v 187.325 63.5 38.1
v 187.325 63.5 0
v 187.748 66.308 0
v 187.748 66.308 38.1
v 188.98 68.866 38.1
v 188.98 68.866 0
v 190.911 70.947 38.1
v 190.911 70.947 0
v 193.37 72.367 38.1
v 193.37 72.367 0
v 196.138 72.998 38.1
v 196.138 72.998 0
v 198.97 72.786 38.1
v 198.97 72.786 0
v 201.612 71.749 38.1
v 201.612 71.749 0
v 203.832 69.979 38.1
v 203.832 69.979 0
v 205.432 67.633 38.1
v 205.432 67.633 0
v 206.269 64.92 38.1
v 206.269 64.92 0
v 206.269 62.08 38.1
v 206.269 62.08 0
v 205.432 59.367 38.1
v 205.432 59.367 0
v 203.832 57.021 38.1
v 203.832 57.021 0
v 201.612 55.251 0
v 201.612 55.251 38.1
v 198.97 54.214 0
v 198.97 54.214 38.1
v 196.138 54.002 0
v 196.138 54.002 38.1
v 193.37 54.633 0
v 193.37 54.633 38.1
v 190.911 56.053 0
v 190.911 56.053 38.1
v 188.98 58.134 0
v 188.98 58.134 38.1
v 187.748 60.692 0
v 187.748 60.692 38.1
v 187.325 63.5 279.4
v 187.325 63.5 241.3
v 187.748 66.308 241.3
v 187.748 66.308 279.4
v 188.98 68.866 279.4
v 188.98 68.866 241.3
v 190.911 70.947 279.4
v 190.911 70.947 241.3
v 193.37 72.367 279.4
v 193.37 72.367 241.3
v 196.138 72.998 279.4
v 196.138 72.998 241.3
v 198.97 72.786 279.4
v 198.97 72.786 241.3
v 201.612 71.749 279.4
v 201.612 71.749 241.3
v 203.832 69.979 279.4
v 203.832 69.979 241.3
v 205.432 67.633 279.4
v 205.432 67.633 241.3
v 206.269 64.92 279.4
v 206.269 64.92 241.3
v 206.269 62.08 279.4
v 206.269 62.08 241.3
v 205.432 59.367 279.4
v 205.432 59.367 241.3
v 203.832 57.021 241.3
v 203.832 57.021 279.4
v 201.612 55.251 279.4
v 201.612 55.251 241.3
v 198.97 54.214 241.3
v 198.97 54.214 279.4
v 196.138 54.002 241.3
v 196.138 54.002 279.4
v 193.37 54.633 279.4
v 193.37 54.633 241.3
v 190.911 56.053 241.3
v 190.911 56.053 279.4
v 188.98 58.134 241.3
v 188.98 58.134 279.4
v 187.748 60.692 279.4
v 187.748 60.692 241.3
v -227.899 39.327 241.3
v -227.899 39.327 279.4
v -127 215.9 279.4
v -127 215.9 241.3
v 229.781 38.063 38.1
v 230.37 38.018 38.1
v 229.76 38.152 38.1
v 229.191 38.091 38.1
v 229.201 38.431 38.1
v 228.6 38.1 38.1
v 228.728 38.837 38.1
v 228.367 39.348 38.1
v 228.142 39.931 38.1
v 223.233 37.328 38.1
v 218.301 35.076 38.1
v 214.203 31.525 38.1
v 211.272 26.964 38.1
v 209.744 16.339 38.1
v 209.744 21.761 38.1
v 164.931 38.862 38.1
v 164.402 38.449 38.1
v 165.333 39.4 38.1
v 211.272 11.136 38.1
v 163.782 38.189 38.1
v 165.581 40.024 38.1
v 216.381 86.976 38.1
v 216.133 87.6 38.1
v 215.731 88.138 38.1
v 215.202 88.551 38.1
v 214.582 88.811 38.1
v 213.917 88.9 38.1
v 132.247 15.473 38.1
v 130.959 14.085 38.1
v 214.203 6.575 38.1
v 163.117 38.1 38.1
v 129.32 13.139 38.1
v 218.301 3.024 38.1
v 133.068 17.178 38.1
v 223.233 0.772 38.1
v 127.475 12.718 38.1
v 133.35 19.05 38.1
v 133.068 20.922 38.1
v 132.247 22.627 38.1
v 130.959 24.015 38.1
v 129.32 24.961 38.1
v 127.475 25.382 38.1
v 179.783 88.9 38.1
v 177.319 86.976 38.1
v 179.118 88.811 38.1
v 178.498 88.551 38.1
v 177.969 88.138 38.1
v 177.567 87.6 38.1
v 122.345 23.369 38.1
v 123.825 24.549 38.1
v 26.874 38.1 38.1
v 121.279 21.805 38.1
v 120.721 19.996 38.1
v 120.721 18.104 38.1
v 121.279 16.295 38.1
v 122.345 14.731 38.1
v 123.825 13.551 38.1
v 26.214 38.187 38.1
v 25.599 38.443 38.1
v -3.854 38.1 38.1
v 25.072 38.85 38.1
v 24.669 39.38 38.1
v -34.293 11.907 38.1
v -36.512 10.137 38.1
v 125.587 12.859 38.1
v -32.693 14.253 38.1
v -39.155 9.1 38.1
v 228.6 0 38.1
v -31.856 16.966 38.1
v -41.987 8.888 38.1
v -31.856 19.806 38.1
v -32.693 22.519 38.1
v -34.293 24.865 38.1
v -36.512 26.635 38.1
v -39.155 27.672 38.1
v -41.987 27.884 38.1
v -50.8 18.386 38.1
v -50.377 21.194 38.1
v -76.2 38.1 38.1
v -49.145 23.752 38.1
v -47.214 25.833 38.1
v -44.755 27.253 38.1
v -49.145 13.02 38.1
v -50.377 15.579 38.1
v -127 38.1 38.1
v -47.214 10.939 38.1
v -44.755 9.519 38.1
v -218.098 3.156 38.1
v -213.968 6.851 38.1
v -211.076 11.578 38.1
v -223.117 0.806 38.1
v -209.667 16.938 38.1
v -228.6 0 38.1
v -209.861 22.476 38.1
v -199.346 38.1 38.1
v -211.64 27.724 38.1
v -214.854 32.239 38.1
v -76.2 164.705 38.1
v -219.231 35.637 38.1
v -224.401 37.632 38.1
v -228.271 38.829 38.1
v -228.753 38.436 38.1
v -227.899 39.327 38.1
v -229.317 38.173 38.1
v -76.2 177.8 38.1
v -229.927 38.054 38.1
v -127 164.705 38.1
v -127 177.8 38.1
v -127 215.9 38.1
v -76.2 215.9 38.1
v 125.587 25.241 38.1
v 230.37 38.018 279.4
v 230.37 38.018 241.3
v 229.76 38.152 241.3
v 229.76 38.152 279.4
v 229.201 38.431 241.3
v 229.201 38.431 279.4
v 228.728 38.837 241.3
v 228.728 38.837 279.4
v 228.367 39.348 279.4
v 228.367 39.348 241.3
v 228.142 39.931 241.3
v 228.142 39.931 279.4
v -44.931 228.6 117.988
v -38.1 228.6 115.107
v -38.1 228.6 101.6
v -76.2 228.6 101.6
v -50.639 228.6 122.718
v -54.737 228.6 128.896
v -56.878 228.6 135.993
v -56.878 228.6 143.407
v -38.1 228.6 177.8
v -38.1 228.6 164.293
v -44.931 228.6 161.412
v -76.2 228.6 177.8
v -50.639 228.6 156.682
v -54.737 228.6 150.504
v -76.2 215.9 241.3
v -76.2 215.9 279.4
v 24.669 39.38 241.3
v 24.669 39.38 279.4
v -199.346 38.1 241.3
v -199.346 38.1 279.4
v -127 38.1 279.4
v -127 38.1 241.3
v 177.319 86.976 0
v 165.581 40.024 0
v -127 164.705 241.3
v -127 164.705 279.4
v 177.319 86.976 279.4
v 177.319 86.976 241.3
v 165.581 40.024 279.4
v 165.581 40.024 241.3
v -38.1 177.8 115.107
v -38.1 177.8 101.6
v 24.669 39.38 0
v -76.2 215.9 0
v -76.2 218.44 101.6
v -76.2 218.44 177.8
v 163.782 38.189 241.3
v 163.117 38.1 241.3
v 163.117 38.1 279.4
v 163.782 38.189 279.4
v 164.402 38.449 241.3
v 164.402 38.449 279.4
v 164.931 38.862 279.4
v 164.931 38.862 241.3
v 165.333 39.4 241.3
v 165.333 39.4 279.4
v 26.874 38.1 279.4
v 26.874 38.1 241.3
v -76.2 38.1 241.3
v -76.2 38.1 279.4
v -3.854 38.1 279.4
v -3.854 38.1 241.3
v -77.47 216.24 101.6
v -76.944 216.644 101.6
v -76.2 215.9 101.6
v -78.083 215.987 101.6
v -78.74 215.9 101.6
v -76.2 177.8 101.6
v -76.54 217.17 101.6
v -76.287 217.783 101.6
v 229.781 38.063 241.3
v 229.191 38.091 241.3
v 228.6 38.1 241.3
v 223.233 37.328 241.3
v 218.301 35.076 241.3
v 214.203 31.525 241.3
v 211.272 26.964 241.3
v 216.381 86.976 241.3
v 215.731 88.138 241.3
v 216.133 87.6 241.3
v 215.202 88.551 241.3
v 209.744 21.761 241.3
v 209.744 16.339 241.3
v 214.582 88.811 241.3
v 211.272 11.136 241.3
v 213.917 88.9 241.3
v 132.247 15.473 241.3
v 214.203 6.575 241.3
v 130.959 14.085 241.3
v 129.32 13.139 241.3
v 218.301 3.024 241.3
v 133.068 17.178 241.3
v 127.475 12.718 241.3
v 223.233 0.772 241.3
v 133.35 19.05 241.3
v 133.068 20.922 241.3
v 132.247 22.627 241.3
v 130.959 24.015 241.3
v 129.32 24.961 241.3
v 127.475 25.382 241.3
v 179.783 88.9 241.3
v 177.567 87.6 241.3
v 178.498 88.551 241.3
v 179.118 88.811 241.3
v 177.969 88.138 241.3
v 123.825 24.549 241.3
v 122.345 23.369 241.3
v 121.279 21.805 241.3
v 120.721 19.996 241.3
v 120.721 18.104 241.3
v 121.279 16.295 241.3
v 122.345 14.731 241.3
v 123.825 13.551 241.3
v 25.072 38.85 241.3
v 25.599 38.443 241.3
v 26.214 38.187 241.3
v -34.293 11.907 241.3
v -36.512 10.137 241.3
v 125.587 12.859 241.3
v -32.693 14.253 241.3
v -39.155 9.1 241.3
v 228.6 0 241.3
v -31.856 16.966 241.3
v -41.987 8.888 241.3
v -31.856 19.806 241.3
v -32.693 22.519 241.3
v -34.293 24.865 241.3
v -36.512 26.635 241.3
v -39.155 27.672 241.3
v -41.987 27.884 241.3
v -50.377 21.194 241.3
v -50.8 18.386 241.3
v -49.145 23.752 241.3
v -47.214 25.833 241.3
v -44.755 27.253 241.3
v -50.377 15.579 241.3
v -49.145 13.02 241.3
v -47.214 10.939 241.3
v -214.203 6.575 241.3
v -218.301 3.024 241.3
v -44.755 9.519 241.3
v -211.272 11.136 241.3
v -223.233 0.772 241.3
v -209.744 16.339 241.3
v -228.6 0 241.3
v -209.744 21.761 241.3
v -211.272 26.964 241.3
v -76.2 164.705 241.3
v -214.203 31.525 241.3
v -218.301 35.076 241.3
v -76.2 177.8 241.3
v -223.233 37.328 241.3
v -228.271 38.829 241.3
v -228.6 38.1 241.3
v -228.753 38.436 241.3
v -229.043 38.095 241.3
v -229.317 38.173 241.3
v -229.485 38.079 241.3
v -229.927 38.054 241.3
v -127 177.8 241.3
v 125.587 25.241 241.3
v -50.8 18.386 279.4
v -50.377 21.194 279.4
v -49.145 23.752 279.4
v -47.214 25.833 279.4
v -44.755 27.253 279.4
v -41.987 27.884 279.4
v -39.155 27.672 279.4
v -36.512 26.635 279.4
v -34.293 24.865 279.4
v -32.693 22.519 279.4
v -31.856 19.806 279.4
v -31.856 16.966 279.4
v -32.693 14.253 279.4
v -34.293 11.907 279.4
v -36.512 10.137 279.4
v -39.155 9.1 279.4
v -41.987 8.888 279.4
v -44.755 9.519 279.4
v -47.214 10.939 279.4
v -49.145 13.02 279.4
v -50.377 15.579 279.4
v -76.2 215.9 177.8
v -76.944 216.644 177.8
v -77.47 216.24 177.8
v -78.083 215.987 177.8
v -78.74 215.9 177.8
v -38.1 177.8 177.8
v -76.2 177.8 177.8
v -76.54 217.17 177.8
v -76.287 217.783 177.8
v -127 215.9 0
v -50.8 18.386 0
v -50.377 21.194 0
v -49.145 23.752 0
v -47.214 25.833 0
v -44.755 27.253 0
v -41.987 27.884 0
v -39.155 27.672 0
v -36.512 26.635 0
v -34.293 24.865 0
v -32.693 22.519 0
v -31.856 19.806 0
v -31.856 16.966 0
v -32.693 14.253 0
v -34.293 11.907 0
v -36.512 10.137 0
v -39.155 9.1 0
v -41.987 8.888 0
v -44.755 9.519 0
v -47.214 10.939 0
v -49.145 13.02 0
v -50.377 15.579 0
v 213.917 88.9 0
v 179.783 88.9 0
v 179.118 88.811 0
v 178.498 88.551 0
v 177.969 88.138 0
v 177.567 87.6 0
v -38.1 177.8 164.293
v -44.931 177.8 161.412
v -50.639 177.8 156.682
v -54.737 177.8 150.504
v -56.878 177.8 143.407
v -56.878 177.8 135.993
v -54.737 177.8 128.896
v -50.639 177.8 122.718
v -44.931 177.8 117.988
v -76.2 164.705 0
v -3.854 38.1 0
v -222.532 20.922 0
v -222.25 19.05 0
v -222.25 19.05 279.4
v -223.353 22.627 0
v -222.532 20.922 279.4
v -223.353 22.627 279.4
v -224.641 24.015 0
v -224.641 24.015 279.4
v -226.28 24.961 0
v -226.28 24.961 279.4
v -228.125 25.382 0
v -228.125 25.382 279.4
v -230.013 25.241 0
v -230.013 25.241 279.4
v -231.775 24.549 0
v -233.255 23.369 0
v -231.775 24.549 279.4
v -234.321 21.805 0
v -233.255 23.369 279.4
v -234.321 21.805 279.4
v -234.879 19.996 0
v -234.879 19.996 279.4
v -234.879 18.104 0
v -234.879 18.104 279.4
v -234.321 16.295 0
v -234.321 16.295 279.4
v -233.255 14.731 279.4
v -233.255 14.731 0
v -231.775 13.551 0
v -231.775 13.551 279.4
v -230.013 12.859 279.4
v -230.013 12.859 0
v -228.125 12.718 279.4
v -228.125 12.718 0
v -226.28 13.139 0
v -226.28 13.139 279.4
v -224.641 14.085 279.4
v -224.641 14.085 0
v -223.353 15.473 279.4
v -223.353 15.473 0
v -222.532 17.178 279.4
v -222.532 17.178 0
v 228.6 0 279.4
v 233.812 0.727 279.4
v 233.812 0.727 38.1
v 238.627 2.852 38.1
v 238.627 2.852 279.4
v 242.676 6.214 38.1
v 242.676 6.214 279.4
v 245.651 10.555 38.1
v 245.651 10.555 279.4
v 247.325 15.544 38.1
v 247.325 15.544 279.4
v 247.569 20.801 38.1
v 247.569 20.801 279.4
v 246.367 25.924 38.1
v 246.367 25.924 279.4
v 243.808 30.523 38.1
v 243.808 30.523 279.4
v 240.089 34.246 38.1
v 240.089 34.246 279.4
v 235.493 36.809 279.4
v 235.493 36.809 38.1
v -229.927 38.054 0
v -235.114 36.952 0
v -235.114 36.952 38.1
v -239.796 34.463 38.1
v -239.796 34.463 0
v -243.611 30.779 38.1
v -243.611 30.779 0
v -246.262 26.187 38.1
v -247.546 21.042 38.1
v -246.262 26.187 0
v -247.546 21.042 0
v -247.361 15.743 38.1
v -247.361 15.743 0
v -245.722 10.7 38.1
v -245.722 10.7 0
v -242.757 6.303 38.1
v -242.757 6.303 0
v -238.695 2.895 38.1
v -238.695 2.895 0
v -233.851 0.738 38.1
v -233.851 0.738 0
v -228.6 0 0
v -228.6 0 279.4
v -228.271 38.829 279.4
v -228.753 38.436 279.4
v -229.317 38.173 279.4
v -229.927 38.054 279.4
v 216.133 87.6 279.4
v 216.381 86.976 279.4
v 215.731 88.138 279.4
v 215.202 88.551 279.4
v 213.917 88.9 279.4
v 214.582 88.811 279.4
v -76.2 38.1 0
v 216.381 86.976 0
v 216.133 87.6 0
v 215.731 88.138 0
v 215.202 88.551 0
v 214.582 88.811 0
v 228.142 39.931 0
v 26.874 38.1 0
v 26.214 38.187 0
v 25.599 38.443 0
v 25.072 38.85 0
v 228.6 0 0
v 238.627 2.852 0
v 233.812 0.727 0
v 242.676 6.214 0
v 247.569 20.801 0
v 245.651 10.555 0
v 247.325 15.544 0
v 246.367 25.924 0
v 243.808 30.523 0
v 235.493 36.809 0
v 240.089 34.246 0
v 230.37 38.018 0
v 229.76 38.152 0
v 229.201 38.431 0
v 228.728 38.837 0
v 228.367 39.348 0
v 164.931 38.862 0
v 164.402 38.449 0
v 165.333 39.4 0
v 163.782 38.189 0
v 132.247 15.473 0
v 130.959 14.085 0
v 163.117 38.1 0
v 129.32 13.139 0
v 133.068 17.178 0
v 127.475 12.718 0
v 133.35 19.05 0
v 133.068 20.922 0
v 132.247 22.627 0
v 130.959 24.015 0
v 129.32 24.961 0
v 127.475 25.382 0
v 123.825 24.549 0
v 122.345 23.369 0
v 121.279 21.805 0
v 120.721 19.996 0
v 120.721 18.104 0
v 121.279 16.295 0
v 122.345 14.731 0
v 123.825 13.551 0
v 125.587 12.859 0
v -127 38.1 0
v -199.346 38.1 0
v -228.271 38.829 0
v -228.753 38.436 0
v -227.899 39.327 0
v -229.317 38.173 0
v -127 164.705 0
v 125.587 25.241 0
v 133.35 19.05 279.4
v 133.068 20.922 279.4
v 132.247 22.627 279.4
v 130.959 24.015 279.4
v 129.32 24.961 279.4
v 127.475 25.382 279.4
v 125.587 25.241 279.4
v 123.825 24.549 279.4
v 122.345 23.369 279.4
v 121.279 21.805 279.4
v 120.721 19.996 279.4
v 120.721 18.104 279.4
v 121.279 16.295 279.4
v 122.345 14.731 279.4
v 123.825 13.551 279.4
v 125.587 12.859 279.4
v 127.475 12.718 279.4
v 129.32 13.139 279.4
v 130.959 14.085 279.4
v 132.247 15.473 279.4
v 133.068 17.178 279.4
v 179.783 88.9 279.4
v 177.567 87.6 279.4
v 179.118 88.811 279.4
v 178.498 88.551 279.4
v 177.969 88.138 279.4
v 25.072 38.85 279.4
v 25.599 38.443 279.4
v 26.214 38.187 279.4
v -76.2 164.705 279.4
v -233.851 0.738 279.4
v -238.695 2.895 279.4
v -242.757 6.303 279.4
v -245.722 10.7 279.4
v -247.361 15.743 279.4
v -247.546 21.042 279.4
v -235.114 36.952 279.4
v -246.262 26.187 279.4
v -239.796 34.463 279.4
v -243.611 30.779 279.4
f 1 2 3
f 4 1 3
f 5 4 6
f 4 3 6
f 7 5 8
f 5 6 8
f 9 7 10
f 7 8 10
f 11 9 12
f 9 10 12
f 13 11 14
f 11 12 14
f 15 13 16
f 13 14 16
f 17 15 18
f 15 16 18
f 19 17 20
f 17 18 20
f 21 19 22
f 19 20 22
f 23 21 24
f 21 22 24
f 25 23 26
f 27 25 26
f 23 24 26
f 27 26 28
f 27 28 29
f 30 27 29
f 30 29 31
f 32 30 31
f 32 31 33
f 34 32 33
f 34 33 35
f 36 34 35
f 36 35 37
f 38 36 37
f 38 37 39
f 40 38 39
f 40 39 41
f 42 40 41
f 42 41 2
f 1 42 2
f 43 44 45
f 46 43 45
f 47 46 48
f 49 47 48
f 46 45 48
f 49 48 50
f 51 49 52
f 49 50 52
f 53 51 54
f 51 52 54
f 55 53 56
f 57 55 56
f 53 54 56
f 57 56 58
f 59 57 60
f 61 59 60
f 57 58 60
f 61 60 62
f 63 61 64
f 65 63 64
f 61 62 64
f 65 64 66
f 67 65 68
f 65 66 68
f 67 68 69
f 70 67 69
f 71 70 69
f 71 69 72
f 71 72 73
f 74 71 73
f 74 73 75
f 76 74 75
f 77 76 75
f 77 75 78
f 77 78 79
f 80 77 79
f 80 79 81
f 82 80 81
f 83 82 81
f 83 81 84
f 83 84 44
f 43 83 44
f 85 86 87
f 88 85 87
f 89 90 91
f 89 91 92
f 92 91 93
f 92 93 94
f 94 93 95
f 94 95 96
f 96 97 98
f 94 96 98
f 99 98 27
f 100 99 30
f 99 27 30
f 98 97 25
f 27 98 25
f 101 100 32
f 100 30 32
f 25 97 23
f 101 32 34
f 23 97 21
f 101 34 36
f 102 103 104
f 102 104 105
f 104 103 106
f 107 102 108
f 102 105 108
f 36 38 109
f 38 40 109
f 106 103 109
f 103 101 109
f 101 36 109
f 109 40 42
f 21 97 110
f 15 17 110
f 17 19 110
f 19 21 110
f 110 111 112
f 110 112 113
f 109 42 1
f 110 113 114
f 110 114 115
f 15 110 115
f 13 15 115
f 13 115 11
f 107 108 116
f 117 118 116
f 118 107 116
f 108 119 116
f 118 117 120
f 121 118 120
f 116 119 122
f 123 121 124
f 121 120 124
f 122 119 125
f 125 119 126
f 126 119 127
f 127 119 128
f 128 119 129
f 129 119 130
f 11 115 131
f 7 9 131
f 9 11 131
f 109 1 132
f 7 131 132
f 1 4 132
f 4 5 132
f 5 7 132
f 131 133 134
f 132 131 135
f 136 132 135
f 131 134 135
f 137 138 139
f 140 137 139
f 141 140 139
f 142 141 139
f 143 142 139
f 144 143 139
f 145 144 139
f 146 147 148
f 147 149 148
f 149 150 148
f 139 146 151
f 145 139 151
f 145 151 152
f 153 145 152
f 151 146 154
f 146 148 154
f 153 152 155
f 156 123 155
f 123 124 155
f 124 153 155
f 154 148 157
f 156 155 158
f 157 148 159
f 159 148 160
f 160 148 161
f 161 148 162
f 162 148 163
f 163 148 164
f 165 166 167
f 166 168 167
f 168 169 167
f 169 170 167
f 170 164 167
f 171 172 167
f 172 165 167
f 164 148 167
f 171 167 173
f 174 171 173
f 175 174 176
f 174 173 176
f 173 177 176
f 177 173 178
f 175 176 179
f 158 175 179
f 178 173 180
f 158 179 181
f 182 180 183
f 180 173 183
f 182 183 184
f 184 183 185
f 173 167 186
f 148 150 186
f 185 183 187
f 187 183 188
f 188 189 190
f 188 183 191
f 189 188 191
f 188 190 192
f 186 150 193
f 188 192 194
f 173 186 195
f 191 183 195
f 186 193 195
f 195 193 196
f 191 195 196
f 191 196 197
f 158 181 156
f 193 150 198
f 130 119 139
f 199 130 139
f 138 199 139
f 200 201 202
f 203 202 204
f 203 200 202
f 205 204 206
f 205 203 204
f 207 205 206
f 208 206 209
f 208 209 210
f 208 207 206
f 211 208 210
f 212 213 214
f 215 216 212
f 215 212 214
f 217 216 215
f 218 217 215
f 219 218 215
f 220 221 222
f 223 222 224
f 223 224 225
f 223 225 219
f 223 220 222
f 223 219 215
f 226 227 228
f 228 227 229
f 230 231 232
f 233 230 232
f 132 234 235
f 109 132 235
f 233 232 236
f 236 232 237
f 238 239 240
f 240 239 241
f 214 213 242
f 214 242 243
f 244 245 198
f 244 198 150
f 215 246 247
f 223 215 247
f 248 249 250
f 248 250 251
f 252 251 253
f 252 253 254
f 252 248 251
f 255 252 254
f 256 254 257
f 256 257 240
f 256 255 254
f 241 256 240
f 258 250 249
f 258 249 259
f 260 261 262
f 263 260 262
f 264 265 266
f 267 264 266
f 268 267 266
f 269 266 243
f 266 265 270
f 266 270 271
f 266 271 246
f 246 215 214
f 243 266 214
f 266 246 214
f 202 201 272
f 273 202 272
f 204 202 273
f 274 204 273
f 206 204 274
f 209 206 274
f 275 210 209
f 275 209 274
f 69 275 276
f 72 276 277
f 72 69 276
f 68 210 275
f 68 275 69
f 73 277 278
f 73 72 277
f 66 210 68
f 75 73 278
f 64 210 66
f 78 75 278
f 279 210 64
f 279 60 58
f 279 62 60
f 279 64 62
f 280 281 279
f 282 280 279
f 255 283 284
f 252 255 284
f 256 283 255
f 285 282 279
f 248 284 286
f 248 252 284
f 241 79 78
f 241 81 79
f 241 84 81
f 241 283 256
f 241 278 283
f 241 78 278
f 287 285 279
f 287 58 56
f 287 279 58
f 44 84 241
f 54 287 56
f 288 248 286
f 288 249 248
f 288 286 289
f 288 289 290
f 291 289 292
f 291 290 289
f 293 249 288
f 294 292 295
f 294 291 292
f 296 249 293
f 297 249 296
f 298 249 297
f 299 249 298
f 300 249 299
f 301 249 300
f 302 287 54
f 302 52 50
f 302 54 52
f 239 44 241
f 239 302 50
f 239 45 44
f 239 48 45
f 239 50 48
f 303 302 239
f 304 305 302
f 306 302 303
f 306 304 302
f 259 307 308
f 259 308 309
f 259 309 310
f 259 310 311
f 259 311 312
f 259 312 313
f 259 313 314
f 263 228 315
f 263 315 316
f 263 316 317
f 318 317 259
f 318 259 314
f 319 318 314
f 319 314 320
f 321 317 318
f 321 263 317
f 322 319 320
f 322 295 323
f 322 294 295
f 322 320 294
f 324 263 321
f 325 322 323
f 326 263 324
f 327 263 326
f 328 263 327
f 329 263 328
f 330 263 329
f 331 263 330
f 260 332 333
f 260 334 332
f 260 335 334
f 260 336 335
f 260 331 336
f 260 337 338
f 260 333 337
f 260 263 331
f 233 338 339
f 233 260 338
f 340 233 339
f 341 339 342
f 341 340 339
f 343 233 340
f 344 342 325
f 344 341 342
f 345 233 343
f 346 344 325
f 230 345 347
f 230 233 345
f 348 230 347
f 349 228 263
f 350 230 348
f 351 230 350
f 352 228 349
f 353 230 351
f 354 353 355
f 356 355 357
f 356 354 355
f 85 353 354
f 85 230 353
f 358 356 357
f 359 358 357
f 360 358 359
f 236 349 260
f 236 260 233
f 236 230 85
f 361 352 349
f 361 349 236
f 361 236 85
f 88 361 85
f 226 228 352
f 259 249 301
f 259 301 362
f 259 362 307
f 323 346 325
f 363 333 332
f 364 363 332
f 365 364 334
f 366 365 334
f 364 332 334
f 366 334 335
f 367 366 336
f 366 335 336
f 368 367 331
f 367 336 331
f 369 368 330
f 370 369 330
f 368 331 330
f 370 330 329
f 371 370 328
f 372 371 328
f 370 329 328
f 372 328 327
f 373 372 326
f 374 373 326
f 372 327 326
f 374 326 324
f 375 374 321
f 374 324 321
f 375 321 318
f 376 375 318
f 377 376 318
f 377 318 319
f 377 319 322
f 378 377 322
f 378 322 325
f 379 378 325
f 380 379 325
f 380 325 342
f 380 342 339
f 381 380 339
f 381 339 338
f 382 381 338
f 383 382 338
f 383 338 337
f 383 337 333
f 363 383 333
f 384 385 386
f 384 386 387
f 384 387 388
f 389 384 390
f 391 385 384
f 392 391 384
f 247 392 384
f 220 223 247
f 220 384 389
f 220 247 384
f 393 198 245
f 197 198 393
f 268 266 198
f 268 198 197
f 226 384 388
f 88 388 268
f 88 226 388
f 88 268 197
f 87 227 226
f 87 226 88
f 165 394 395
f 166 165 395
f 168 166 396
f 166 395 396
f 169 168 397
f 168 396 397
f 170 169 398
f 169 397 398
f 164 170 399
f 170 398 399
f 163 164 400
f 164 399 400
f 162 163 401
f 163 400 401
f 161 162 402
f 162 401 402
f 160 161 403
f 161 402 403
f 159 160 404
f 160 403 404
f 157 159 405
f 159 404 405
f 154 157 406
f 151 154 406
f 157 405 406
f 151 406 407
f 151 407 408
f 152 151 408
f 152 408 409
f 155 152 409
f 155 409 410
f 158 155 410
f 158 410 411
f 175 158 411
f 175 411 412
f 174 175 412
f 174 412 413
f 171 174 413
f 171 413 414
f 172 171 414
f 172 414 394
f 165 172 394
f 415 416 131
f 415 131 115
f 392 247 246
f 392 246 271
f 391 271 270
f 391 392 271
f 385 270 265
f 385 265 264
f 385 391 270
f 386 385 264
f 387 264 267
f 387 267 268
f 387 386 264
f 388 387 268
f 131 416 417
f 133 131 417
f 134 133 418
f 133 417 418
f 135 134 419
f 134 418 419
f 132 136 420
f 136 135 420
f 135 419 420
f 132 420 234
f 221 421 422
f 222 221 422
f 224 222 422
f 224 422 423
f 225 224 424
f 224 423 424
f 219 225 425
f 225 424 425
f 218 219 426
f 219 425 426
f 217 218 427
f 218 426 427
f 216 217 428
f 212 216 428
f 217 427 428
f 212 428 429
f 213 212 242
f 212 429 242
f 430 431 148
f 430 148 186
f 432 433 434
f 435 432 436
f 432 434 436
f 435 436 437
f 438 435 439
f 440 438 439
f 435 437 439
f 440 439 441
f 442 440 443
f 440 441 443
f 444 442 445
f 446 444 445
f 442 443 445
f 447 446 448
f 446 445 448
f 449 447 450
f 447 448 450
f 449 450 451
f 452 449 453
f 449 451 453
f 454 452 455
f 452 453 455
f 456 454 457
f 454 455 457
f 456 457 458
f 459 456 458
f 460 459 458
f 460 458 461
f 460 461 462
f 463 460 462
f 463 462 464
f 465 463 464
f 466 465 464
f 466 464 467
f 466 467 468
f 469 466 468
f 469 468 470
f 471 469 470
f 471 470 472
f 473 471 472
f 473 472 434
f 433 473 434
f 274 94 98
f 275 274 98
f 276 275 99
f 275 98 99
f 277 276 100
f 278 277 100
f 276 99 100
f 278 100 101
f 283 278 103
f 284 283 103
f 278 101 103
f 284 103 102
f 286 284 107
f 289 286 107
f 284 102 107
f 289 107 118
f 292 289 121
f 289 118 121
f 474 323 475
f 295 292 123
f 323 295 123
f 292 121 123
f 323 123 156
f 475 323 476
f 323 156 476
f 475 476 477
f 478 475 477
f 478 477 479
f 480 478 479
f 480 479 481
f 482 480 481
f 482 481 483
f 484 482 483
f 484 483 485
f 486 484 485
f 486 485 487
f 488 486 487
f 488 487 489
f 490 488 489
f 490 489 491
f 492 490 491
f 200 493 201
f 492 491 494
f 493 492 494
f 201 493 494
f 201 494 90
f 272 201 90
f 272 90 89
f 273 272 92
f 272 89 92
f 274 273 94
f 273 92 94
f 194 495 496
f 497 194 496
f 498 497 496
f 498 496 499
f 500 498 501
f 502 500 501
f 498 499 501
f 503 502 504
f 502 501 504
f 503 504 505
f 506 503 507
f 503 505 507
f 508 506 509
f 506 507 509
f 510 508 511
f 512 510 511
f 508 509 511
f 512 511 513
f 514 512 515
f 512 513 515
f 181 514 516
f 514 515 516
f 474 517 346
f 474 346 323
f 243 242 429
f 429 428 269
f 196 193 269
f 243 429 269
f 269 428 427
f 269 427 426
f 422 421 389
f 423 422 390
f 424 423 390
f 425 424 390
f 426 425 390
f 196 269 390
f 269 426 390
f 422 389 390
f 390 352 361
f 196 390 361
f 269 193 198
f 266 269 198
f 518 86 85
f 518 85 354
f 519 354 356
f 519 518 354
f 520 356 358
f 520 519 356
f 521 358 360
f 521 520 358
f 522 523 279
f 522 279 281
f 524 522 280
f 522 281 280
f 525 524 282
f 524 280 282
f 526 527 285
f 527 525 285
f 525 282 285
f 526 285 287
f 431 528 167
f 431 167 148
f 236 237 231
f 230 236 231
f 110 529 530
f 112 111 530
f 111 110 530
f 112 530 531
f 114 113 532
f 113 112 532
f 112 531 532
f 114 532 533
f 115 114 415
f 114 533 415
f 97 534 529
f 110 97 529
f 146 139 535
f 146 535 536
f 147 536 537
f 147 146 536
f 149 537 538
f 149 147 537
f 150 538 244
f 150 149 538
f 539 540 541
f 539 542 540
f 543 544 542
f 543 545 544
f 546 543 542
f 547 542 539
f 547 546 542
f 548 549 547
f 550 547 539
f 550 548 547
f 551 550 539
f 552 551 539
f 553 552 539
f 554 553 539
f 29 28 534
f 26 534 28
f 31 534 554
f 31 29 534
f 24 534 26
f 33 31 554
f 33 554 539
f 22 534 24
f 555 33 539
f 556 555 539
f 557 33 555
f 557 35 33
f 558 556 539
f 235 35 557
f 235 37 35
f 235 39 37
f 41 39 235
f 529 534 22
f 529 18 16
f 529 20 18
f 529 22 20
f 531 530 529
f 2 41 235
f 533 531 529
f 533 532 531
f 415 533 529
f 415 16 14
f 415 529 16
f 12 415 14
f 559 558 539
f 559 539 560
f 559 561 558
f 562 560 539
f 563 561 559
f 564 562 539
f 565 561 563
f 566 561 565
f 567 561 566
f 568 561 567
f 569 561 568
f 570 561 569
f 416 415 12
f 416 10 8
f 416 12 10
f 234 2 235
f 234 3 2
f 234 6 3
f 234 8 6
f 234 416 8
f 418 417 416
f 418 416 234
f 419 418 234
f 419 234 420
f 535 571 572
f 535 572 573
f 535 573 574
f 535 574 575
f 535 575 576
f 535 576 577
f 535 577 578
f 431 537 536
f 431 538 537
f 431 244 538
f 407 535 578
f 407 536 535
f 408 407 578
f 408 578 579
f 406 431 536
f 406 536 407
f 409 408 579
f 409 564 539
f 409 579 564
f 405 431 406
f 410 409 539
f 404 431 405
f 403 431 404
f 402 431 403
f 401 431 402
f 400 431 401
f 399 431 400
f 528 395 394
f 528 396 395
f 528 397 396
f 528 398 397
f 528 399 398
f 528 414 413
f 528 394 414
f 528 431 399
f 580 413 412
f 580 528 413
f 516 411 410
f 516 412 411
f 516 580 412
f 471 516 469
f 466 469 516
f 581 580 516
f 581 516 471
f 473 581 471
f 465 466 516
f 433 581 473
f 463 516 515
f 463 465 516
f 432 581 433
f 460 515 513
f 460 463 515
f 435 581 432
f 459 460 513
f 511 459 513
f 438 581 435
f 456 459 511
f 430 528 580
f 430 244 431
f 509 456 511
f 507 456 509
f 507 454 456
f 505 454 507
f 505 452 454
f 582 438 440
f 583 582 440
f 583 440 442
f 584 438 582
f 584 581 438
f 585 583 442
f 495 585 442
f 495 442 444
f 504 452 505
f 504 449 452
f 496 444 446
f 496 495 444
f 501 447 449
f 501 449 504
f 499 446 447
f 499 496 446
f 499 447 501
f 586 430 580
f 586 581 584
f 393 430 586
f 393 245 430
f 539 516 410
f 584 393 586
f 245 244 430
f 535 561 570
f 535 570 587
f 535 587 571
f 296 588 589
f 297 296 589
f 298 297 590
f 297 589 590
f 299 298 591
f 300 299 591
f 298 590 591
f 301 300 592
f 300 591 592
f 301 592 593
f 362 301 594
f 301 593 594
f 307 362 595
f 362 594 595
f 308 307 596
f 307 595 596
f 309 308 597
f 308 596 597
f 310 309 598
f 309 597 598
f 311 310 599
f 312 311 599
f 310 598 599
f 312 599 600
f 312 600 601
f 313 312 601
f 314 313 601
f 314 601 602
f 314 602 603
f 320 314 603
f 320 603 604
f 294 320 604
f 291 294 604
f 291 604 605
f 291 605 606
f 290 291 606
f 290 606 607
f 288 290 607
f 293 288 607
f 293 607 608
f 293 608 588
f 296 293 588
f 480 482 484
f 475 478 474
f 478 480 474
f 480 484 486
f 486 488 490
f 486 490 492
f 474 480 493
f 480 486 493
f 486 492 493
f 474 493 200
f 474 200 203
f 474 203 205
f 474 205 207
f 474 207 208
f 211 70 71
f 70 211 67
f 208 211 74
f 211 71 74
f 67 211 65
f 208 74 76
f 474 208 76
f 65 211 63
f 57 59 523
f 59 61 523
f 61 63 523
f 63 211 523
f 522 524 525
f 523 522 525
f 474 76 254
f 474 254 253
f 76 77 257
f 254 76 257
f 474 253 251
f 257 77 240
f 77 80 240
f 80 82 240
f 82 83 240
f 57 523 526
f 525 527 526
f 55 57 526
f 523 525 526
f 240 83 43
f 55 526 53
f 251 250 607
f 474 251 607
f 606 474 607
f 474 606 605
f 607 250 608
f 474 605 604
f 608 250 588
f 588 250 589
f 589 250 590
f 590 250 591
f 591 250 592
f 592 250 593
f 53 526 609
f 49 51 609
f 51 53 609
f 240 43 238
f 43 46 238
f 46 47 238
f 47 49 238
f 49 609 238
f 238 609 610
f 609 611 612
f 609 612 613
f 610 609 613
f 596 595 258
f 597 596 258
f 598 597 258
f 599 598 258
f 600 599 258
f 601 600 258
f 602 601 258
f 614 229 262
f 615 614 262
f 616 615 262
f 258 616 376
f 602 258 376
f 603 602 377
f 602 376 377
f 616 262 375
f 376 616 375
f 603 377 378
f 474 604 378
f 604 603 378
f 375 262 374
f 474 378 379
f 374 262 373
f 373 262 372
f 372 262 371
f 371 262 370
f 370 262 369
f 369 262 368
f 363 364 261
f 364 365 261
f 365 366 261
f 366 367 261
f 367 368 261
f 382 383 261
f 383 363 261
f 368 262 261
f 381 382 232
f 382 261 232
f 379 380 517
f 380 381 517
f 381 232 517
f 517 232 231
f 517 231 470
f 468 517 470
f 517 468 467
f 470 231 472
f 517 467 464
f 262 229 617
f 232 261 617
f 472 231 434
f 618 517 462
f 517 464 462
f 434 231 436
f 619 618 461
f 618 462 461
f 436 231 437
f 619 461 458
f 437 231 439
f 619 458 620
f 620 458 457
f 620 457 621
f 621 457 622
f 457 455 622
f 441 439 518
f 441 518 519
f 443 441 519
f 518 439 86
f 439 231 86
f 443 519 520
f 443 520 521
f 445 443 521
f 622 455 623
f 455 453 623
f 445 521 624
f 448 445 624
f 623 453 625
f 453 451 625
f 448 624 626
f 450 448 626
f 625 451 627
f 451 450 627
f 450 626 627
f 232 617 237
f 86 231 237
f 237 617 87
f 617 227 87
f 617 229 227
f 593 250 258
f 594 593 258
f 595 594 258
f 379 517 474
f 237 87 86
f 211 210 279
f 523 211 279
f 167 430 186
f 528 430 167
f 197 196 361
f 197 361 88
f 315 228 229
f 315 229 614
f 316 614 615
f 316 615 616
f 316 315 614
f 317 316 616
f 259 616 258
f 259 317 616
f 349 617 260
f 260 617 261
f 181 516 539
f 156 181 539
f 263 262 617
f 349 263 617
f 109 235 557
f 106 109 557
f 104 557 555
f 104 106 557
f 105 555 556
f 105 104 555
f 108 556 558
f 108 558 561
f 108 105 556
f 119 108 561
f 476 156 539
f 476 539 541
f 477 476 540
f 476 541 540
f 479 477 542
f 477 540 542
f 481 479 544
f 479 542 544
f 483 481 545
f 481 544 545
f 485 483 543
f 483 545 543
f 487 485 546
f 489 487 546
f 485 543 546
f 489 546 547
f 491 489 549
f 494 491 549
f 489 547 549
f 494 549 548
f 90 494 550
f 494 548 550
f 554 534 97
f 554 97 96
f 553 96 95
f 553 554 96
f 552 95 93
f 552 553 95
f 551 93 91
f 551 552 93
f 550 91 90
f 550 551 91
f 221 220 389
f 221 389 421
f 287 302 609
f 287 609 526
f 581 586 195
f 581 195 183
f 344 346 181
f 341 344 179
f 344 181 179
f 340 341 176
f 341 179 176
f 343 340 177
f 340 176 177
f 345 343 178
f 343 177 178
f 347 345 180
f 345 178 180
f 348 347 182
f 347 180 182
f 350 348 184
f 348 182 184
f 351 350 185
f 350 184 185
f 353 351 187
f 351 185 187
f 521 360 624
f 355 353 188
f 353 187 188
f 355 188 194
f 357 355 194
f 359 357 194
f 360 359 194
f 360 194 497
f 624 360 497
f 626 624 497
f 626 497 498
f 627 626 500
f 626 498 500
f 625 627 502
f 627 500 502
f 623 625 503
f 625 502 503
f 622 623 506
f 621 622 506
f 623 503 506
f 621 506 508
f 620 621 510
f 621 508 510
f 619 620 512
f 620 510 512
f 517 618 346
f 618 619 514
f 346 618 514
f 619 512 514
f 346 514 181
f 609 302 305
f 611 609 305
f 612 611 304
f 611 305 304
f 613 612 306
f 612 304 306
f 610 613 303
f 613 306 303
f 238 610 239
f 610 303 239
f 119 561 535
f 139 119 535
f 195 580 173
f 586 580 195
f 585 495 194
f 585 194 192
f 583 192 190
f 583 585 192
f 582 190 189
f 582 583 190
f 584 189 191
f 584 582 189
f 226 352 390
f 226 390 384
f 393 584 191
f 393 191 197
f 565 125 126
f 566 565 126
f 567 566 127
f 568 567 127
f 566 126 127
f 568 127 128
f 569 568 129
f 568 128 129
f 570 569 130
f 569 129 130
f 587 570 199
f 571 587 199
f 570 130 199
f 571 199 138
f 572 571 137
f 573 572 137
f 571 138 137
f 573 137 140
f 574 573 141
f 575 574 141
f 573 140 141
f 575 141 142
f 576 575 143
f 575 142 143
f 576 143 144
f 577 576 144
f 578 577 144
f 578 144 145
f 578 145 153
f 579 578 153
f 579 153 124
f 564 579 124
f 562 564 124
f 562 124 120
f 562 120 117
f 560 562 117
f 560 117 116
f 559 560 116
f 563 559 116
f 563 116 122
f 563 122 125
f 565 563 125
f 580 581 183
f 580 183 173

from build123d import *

# Parameters (mm, degrees)
BOSS_EXTRUDE1_DEPTH = 38.1
SKETCH2_R           = 19.05
BOSS_EXTRUDE2_DEPTH = 203.2
SKETCH4_W           = 254
SKETCH4_H           = 38.1
BOSS_EXTRUDE3_DEPTH = 177.8
CUT_EXTRUDE3_DEPTH  = 38.1
SKETCH8_R           = 6.35
CUT_EXTRUDE4_DEPTH  = 432.286091243
BOSS_EXTRUDE4_REACH = 409.638
SKETCH9_W           = 50.8
SKETCH9_H           = 38.1
BOSS_EXTRUDE5_DEPTH = 50.8
SKETCH13_W          = 63.5
SKETCH13_H          = 38.1
BOSS_EXTRUDE6_DEPTH = 50.8
CUT_EXTRUDE7_DEPTH  = 438.78172929
FILLET1_R           = 2.54
SKETCH12_R          = 9.525
CUT_EXTRUDE5_DEPTH  = 438.78172929


with BuildPart() as part:
    # Sketch1 → Boss-Extrude1 (new body)
    with BuildSketch(Plane.XY):
        with BuildLine():
            Line((228.6, 38.1), (-228.6, 38.1))
            ThreePointArc((-228.6, 38.1), (-247.65, 19.05), (-228.6, 0))
            Line((-228.6, 0), (228.6, 0))
            ThreePointArc((228.6, 0), (247.65, 19.05), (228.6, 38.1))
        make_face()
    boss_extrude1 = extrude(amount=BOSS_EXTRUDE1_DEPTH)

    # Sketch2 → Boss-Extrude2 (add)
    with BuildSketch(Plane.XY.offset(38.1)):
        with Locations((-228.6, 19.05)):
            Circle(SKETCH2_R)
        with Locations((228.6, 19.05)):
            Circle(SKETCH2_R)
    boss_extrude2 = extrude(amount=BOSS_EXTRUDE2_DEPTH)

    # Mirror3: Boss-Extrude1, Boss-Extrude2 across plane
    add(boss_extrude1.mirror(Plane.XY.offset(139.7)))
    add(boss_extrude2.mirror(Plane.XY.offset(139.7)))

    # Sketch4 → Boss-Extrude3 (add)
    with BuildSketch(Plane(origin=(0, 38.1, 0), x_dir=(1, 0, 0), z_dir=(0, 1, 0))):
        with Locations((-101.6, -260.35)):
            Rectangle(SKETCH4_W, SKETCH4_H)
    boss_extrude3 = extrude(amount=BOSS_EXTRUDE3_DEPTH)

    # Sketch7 → Cut-Extrude3 (cut)
    with BuildSketch(Plane.XY.offset(279.4)):
        Polygon((-228.6, 38.1), (-127, 215.9), (-228.6, 215.9), align=None)
        Polygon((-76.2, 215.9), (25.4, 38.1), (25.4, 215.9), align=None)
        Polygon((-127, 164.704663298), (-199.345521885, 38.1), (-127, 38.1), align=None)
        Polygon((-76.2, 164.704663298), (-76.2, 38.1), (-3.854478115, 38.1), align=None)
    cut_extrude3 = extrude(amount=-CUT_EXTRUDE3_DEPTH, mode=Mode.SUBTRACT)

    # Mirror4: Boss-Extrude3, Cut-Extrude3 across plane
    add(boss_extrude3.mirror(Plane.XY.offset(139.7)))
    add(cut_extrude3.mirror(Plane.XY.offset(139.7)), mode=Mode.SUBTRACT)

    # Sketch8 → Cut-Extrude4 (cut, through all)
    with BuildSketch(Plane.XY.offset(279.4)):
        with Locations((-228.6, 19.05)):
            Circle(SKETCH8_R)
        with Locations((127, 19.05)):
            Circle(SKETCH8_R)
    extrude(amount=-CUT_EXTRUDE4_DEPTH, mode=Mode.SUBTRACT)

    # Sketch9 → Boss-Extrude4 (add, up to next)
    with BuildSketch(Plane(origin=(0, 0, 241.3), x_dir=(-1, 0, 0), z_dir=(0, 0, -1)), mode=Mode.PRIVATE) as boss_extrude4_sk1:
        with Locations((101.6, 196.85)):
            Rectangle(SKETCH9_W, SKETCH9_H)
    boss_extrude4_tool1 = extrude(boss_extrude4_sk1.sketch, amount=BOSS_EXTRUDE4_REACH, mode=Mode.PRIVATE) - part.part
    add(boss_extrude4_tool1.solids().sort_by_distance((-101.6, 196.85, 241.3))[0])

    # Sketch10 → Boss-Extrude5 (add)
    with BuildSketch(Plane.XZ.offset(-177.8)):
        with BuildLine():
            Line((-76.2, 177.8), (-38.1, 177.8))
            Line((-38.1, 177.8), (-38.1, 164.293444248))
            ThreePointArc((-38.1, 164.293444248), (-57.15, 139.7), (-38.1, 115.106555752))
            Line((-38.1, 115.106555752), (-38.1, 101.6))
            Line((-38.1, 101.6), (-76.2, 101.6))
            Line((-76.2, 101.6), (-76.2, 177.8))
        make_face()
    extrude(amount=-BOSS_EXTRUDE5_DEPTH)

    # Sketch13 → Boss-Extrude6 (add)
    with BuildSketch(Plane(origin=(0, 38.1, 0), x_dir=(1, 0, 0), z_dir=(0, 1, 0))):
        with Locations((196.85, -260.35)):
            Rectangle(SKETCH13_W, SKETCH13_H)
        with Locations((196.85, -19.05)):
            Rectangle(SKETCH13_W, SKETCH13_H)
    extrude(amount=BOSS_EXTRUDE6_DEPTH)

    # Sketch14 → Cut-Extrude7 (cut, through all)
    with BuildSketch(Plane(origin=(0, 0, 0), x_dir=(-1, 0, 0), z_dir=(0, 0, -1))):
        Polygon((-177.8, 88.9), (-165.1, 38.1), (-165.1, 88.9), align=None)
        Polygon((-228.6, 38.1), (-215.9, 88.9), (-228.6, 88.9), align=None)
    extrude(amount=-CUT_EXTRUDE7_DEPTH, mode=Mode.SUBTRACT)

    # Fillet1
    fillet1_edges = [part.edges().sort_by_distance(p)[0] for p in [
        (-76.2, 215.9, 139.7),
        (25.4, 38.1, 260.35),
        (25.4, 38.1, 19.05),
        (-228.6, 38.1, 260.35),
        (-228.6, 38.1, 19.05),
        (215.9, 88.9, 260.35),
        (177.8, 88.9, 260.35),
        (165.1, 38.1, 19.05),
        (165.1, 38.1, 260.35),
        (177.8, 88.9, 19.05),
        (215.9, 88.9, 19.05),
        (228.6, 38.1, 19.05),
        (228.6, 38.1, 260.35),
    ]]
    fillet(fillet1_edges, radius=FILLET1_R)

    # Sketch12 → Cut-Extrude5 (cut, through all)
    with BuildSketch(Plane(origin=(0, 0, 0), x_dir=(-1, 0, 0), z_dir=(0, 0, -1))):
        with Locations((41.275, 18.386071678)):
            Circle(SKETCH12_R)
        with Locations((-196.85, 63.5)):
            Circle(SKETCH12_R)
    extrude(amount=-CUT_EXTRUDE5_DEPTH, mode=Mode.SUBTRACT)


solid = part.part
